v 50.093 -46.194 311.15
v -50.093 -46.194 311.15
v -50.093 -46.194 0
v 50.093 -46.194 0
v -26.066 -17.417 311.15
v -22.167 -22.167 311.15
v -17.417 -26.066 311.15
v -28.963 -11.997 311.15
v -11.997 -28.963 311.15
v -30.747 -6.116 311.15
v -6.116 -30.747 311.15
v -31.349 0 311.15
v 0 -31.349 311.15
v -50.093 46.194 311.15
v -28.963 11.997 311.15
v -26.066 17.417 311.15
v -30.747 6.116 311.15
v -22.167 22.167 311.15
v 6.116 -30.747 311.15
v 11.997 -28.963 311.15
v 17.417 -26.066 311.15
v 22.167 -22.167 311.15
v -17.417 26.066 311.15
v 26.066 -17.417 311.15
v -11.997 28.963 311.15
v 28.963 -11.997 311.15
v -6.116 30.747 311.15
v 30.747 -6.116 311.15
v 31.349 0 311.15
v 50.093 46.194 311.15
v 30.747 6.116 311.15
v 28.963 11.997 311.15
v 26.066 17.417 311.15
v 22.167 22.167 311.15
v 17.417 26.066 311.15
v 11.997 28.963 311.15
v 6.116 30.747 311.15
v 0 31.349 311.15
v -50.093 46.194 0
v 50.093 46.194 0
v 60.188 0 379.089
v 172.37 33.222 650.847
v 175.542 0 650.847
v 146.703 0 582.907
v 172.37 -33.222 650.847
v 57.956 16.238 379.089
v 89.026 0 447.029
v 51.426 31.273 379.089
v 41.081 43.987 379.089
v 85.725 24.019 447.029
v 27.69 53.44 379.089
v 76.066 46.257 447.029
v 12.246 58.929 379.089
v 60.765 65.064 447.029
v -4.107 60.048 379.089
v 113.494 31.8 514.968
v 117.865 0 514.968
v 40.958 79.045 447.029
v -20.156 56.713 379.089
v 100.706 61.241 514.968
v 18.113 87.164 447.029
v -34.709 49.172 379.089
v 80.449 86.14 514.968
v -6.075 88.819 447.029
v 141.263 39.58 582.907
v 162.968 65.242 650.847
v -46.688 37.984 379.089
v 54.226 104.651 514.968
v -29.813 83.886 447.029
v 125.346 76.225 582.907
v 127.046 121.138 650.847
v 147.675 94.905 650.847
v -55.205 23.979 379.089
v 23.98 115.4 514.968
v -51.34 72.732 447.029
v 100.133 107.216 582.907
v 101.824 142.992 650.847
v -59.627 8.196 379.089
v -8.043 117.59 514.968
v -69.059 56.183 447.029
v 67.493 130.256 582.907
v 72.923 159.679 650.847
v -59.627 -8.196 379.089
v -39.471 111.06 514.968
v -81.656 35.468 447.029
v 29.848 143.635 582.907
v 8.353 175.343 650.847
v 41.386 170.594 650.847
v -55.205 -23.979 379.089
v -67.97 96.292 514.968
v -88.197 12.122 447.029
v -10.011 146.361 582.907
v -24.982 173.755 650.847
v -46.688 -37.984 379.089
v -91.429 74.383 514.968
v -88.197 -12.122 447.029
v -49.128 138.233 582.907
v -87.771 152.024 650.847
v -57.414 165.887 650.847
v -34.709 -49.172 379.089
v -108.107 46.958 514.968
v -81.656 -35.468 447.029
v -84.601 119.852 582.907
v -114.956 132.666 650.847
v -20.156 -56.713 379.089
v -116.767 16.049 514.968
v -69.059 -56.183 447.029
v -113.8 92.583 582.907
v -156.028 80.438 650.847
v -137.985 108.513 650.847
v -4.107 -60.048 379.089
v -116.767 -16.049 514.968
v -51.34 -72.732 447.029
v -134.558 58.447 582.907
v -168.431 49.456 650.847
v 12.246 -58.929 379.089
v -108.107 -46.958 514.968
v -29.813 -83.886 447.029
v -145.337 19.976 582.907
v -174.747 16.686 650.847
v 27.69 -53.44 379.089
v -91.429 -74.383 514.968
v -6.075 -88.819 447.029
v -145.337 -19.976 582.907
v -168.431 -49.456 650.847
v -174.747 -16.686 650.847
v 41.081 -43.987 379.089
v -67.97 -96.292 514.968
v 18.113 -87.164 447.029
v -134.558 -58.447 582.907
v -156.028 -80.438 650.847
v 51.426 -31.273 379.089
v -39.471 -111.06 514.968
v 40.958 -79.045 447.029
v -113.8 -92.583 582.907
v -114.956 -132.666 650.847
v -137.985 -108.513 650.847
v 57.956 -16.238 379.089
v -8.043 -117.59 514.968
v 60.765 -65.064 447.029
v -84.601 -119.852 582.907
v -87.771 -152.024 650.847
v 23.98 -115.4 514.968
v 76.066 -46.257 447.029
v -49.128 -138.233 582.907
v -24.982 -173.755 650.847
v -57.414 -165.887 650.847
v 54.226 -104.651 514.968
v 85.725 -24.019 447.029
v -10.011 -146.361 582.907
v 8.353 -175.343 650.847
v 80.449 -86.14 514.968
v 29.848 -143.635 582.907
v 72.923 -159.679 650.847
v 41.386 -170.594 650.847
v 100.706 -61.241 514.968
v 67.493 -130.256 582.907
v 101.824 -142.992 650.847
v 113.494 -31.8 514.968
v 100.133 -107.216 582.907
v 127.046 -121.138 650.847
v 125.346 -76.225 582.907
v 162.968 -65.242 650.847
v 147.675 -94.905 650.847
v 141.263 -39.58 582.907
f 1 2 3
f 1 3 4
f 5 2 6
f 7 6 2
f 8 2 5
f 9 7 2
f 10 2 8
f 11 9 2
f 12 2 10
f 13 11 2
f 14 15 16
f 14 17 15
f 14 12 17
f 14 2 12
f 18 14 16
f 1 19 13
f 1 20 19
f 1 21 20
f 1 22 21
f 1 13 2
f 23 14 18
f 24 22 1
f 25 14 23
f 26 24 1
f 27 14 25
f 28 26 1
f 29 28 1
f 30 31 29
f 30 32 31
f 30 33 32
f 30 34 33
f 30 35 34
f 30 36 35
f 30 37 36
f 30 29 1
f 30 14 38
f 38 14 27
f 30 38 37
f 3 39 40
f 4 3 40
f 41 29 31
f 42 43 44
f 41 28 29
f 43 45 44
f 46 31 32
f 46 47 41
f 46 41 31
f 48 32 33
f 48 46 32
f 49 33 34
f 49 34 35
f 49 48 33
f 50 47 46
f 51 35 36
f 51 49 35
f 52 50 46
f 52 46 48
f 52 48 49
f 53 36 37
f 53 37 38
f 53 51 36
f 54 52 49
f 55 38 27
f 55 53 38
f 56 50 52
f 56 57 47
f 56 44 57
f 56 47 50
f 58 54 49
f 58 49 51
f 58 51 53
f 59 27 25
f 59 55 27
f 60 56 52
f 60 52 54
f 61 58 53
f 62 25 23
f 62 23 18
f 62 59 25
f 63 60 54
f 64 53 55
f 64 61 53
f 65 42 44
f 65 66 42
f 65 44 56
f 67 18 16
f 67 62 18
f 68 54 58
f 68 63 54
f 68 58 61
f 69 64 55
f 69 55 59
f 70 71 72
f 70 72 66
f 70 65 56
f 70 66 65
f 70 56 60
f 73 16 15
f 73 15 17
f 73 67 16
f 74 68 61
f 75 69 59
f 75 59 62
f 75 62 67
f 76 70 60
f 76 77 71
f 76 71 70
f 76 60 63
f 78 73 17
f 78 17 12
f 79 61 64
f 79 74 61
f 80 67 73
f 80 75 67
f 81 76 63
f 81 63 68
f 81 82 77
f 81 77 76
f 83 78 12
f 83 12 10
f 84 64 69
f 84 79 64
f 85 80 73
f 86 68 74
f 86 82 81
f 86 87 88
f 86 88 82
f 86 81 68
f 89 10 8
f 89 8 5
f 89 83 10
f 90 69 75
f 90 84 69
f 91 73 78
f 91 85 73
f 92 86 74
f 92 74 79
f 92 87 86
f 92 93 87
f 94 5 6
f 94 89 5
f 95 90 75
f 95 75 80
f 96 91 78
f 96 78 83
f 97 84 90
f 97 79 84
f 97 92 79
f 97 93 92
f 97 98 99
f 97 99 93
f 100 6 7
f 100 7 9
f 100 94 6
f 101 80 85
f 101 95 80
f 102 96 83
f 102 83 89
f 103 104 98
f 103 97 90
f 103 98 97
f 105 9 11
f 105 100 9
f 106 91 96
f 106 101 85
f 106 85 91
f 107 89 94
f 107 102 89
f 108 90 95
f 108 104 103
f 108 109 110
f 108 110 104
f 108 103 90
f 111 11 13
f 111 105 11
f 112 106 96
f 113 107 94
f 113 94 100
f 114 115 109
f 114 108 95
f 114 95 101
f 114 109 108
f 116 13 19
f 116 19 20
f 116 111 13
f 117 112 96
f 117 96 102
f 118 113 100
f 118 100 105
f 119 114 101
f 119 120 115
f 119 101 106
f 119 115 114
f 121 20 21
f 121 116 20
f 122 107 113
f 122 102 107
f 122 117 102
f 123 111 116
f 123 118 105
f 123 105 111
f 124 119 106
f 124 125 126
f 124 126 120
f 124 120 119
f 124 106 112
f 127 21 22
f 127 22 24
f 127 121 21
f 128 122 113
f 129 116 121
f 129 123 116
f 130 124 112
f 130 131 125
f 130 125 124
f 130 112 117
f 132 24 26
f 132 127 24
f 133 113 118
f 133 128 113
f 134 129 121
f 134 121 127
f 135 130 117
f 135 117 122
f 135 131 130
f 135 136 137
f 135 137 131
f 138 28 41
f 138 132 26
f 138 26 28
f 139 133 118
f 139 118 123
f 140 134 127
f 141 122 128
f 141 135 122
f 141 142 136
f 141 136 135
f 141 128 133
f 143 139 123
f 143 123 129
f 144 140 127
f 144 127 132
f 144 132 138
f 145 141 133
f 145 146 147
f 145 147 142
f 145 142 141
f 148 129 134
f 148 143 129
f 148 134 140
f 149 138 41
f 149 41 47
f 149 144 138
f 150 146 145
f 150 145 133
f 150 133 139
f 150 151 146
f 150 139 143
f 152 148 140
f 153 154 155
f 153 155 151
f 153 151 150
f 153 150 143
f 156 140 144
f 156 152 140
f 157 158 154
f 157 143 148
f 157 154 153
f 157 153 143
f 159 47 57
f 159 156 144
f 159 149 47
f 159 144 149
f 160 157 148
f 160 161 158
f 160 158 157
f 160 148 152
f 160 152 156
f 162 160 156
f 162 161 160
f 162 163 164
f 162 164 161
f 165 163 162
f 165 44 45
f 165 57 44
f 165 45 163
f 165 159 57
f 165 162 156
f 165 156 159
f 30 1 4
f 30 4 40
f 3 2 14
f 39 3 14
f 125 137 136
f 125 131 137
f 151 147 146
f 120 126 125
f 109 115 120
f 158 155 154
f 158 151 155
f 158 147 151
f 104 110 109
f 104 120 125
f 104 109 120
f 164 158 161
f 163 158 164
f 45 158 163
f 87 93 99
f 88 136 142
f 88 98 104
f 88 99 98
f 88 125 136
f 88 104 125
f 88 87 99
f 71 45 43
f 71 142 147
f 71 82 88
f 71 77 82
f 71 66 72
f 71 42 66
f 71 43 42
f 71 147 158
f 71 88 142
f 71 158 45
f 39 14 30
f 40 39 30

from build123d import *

# Parameters (mm, degrees)
F0_W     = 100.1865565777
F0_H     = 92.3875570297
F1_DEPTH = 311.15
F2_R     = 31.3492715111
F3_DEPTH = 339.6968106
F3_TAPER = -23


# Not quite as in the source:
# - an extrude ends at something that could not be found from the text; its depth is read off the source's solid


with BuildPart() as f1:
    # F0 (on Top) → F1 (new body)
    with BuildSketch(Plane.XY):
        Rectangle(F0_W, F0_H)
    extrude(amount=F1_DEPTH)

    # F2 (on face) → F3 (join, through all)
    with BuildSketch(Plane.XY.offset(311.15)):
        Circle(F2_R)
    extrude(amount=F3_DEPTH, taper=F3_TAPER)


solid = f1.part
